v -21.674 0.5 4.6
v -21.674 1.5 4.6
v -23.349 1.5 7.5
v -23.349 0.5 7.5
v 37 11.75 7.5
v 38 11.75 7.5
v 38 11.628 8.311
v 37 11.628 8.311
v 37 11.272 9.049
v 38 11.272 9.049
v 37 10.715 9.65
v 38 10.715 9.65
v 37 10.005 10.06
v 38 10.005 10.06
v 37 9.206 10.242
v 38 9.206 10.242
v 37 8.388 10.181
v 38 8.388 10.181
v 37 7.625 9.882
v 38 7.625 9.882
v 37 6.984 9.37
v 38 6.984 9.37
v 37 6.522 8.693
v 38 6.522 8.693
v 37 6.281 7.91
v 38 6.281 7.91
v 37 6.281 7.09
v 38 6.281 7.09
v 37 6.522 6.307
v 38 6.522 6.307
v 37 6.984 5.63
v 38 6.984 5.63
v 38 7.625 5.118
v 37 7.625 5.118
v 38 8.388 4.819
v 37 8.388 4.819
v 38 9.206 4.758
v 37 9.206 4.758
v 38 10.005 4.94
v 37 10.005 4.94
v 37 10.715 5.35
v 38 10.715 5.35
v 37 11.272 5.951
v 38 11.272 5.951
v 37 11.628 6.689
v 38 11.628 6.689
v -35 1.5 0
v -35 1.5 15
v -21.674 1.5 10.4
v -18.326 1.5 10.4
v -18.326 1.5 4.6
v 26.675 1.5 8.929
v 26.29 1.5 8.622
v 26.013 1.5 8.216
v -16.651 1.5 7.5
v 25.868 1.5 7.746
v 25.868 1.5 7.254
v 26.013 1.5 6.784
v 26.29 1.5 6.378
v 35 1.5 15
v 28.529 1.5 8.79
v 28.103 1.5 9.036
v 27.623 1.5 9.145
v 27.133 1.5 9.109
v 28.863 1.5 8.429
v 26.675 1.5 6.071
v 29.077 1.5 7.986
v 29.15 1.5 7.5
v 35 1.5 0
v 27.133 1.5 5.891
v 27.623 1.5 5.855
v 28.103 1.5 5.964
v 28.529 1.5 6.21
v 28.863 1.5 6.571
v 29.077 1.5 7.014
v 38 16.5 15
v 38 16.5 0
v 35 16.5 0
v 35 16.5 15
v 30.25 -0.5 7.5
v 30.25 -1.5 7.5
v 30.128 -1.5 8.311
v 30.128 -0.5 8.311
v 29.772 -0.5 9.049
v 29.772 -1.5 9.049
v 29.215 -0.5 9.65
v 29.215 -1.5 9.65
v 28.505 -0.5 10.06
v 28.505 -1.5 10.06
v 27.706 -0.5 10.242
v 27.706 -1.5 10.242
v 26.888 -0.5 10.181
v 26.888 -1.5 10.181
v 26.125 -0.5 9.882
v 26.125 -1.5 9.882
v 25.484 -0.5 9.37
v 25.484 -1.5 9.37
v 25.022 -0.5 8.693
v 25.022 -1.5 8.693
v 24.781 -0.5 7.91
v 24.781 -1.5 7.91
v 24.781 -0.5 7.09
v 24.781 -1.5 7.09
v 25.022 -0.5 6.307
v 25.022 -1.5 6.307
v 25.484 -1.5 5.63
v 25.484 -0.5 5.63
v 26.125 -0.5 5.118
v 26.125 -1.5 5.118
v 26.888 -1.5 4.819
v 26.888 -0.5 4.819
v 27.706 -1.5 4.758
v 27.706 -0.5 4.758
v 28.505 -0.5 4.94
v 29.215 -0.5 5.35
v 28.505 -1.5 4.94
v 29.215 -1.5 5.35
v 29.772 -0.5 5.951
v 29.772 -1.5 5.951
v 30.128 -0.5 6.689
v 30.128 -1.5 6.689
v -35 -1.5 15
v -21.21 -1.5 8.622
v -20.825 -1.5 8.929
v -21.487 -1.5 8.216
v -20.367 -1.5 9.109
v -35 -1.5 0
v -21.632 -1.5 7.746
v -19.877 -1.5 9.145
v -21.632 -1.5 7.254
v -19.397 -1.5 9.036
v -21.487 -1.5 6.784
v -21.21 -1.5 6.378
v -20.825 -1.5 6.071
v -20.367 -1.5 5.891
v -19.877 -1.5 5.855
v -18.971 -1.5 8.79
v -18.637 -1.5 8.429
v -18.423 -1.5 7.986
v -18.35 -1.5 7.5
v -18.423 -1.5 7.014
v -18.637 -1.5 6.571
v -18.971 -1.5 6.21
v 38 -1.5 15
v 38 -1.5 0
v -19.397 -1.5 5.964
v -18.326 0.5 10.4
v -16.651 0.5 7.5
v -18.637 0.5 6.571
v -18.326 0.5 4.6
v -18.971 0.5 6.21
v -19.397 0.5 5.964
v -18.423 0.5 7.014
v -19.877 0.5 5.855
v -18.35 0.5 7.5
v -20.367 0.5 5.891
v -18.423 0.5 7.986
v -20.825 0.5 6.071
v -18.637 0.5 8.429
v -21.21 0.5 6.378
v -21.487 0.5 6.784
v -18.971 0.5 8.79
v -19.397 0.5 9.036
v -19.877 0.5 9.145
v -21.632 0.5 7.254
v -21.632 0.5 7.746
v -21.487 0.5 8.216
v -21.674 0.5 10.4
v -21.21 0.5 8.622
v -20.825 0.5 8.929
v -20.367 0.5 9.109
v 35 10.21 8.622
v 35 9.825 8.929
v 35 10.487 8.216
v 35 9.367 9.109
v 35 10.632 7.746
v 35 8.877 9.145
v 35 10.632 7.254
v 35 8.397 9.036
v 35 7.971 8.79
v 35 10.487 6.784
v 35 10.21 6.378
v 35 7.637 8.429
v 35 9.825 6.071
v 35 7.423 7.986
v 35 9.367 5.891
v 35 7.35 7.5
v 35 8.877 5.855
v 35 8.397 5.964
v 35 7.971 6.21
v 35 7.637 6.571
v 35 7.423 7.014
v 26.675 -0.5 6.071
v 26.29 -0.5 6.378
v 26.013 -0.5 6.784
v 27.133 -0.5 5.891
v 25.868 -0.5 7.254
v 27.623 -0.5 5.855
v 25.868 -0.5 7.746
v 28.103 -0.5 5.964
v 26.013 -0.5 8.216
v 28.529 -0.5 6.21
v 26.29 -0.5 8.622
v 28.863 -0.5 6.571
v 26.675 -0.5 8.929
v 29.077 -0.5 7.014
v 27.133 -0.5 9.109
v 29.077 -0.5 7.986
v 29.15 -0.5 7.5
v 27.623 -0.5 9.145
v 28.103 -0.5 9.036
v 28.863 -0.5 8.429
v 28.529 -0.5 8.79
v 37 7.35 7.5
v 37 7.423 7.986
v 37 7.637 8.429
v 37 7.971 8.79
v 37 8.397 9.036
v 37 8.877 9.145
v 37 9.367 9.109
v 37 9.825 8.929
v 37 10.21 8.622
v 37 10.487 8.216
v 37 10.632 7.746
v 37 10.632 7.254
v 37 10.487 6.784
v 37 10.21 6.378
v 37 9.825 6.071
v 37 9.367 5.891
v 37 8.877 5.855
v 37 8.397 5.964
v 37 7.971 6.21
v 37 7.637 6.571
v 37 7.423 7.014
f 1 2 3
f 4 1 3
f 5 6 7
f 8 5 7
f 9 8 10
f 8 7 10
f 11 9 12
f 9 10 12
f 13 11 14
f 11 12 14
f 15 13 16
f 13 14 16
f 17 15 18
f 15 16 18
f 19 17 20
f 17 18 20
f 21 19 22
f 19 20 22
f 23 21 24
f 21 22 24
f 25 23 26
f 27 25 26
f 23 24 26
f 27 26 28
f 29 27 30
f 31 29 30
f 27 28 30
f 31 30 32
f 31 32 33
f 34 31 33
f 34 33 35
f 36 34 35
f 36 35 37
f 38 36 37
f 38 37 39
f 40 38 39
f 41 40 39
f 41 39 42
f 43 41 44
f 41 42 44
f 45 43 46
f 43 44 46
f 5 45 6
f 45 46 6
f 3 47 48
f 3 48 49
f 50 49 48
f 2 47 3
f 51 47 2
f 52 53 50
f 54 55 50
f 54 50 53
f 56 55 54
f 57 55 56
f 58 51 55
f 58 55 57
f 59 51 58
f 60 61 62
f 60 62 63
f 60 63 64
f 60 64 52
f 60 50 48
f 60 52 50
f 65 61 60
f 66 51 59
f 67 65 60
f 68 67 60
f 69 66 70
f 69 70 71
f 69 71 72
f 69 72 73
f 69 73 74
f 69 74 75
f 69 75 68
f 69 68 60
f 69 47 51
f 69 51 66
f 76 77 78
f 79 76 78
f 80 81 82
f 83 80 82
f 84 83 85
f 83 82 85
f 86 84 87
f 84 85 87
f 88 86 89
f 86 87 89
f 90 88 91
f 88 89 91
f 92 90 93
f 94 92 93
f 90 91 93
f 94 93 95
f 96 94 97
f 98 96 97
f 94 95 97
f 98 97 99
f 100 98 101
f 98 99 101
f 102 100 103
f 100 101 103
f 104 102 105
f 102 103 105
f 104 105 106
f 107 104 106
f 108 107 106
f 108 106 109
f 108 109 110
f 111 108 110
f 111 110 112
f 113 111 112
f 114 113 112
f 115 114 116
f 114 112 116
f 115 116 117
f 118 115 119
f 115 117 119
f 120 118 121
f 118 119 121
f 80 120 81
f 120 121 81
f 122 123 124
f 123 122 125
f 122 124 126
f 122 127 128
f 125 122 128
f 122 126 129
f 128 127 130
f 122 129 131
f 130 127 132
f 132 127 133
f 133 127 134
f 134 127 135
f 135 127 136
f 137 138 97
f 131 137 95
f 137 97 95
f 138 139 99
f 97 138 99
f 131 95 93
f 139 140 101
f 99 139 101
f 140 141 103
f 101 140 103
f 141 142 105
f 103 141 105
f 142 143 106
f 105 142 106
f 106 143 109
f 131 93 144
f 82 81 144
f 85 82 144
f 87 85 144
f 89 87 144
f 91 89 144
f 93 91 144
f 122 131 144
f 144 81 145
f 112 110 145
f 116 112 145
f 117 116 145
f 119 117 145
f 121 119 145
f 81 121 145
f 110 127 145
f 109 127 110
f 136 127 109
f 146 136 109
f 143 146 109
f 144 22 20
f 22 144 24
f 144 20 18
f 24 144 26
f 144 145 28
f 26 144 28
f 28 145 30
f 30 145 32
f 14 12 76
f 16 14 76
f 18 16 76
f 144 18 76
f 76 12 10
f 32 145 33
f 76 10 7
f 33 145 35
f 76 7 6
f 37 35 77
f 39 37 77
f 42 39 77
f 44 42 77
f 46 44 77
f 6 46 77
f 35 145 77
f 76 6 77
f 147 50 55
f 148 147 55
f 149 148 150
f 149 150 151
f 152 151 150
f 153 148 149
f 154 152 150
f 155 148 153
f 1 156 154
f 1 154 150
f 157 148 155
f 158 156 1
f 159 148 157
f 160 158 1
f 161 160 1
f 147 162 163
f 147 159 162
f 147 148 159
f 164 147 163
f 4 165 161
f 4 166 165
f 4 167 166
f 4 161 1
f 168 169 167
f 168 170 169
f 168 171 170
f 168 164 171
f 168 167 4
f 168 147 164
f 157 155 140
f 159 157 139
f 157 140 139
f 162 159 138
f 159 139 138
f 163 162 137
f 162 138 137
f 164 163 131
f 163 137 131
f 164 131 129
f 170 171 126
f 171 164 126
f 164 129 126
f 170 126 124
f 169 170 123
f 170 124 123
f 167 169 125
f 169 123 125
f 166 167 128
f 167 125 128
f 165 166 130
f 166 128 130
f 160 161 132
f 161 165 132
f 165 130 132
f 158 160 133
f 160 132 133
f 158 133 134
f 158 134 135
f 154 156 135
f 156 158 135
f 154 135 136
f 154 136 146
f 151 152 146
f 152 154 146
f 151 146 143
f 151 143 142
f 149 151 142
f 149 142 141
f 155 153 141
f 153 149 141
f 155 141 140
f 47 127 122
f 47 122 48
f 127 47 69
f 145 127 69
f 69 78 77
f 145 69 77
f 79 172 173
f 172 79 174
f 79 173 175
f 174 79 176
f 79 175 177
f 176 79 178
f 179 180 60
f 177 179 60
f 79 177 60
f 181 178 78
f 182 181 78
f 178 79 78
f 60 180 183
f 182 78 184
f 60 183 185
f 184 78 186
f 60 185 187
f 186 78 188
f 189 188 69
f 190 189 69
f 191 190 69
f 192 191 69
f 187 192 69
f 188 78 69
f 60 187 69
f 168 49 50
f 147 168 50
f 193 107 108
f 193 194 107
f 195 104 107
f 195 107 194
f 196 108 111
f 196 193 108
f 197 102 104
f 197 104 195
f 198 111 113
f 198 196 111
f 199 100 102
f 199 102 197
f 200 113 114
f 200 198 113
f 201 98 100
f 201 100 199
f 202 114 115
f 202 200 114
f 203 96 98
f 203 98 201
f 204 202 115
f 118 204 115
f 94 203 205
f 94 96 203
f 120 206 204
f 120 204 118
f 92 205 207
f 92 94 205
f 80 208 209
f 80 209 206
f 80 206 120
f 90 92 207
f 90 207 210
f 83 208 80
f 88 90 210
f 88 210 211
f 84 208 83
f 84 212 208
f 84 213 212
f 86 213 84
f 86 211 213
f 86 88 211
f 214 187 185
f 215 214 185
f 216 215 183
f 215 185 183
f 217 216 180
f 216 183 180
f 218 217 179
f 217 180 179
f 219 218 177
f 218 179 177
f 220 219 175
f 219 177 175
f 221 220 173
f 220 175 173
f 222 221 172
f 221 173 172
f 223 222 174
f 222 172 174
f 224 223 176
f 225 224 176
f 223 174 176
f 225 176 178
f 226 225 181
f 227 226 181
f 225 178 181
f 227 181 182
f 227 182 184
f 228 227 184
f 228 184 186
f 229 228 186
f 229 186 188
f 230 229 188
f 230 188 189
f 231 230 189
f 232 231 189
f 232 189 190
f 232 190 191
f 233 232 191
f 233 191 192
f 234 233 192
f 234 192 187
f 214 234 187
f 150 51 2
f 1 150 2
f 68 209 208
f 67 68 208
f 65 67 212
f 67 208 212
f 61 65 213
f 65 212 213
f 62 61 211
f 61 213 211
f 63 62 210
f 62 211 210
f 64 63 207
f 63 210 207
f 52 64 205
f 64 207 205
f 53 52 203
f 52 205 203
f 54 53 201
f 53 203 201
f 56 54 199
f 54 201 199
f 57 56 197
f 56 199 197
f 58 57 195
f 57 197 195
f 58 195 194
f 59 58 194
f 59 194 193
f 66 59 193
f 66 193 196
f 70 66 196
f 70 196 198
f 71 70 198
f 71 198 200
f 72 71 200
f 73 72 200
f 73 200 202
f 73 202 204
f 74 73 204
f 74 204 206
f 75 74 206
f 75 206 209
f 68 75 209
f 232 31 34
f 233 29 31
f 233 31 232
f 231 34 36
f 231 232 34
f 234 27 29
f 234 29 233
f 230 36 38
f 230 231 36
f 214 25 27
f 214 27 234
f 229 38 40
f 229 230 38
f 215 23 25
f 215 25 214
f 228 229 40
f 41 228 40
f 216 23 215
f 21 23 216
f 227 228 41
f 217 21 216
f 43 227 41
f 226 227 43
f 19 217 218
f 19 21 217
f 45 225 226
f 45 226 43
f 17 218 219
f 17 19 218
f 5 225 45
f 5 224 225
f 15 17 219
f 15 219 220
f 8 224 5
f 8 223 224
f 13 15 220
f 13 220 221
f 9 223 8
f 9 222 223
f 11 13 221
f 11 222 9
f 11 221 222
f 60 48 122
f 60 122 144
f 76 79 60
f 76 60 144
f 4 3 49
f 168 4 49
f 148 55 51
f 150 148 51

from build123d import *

# Parameters (mm, degrees)
F0_W      = 70
F0_H      = 3
F1_DEPTH  = 15
F2_R      = 1.65
F3_DEPTH  = 25
F4_R      = 2.75
F5_DEPTH  = 1
F6_R      = 1.65
F7_DEPTH  = 3
F8_R      = 1.65
F9_DEPTH  = 3
F8_R_2    = 2.75
F10_DEPTH = 1
F11_R     = 1.65
F12_DEPTH = 1


with BuildPart() as f1:
    # F0 (on Top) → F1 (new body)
    with BuildSketch(Plane.XY):
        Rectangle(F0_W, F0_H)
        Polygon((35, 16.5), (35, 1.5), (35, -1.5), (38, -1.5), (38, 16.5), align=None)
    extrude(amount=F1_DEPTH)

    # F2 (on face) → F3 (cut)
    with BuildSketch(Plane(origin=(35, 0, 0), x_dir=(0, -1, 0), z_dir=(-1, 0, 0))):
        with Locations((-9, 7.5)):
            Circle(F2_R)
    extrude(amount=-F3_DEPTH, mode=Mode.SUBTRACT)

    # F4 (on face) → F5 (cut)
    with BuildSketch(Plane.YZ.offset(38)):
        with Locations((9, 7.5)):
            Circle(F4_R)
    extrude(amount=-F5_DEPTH, mode=Mode.SUBTRACT)

    # F6 (on face) → F7 (cut, through all)
    with BuildSketch(Plane.XZ.offset(1.5)):
        with Locations((-20, 7.5)):
            Circle(F6_R)
    extrude(amount=-F7_DEPTH, mode=Mode.SUBTRACT)

    # F8 (on face) → F9 (cut, through all)
    with BuildSketch(Plane.XZ.offset(1.5)):
        with Locations((27.5, 7.5)):
            Circle(F8_R)
    extrude(amount=-F9_DEPTH, mode=Mode.SUBTRACT)

    # F8 (on face) → F10 (cut)
    with BuildSketch(Plane.XZ.offset(1.5)):
        with Locations((27.5, 7.5)):
            Circle(F8_R_2)
        with Locations((27.5, 7.5)):
            Circle(F8_R, mode=Mode.SUBTRACT)
    extrude(amount=-F10_DEPTH, mode=Mode.SUBTRACT)

    # F11 (on face) → F12 (cut)
    with BuildSketch(Plane(origin=(0, 1.5, 0), x_dir=(-1, 0, 0), z_dir=(0, 1, 0))):
        Polygon((21.674316, 10.4), (18.325684, 10.4), (16.651368, 7.5), (18.325684, 4.6), (21.674316, 4.6), (23.348632, 7.5), align=None)
        with Locations((20, 7.5)):
            Circle(F11_R, mode=Mode.SUBTRACT)
    extrude(amount=-F12_DEPTH, mode=Mode.SUBTRACT)


solid = f1.part
